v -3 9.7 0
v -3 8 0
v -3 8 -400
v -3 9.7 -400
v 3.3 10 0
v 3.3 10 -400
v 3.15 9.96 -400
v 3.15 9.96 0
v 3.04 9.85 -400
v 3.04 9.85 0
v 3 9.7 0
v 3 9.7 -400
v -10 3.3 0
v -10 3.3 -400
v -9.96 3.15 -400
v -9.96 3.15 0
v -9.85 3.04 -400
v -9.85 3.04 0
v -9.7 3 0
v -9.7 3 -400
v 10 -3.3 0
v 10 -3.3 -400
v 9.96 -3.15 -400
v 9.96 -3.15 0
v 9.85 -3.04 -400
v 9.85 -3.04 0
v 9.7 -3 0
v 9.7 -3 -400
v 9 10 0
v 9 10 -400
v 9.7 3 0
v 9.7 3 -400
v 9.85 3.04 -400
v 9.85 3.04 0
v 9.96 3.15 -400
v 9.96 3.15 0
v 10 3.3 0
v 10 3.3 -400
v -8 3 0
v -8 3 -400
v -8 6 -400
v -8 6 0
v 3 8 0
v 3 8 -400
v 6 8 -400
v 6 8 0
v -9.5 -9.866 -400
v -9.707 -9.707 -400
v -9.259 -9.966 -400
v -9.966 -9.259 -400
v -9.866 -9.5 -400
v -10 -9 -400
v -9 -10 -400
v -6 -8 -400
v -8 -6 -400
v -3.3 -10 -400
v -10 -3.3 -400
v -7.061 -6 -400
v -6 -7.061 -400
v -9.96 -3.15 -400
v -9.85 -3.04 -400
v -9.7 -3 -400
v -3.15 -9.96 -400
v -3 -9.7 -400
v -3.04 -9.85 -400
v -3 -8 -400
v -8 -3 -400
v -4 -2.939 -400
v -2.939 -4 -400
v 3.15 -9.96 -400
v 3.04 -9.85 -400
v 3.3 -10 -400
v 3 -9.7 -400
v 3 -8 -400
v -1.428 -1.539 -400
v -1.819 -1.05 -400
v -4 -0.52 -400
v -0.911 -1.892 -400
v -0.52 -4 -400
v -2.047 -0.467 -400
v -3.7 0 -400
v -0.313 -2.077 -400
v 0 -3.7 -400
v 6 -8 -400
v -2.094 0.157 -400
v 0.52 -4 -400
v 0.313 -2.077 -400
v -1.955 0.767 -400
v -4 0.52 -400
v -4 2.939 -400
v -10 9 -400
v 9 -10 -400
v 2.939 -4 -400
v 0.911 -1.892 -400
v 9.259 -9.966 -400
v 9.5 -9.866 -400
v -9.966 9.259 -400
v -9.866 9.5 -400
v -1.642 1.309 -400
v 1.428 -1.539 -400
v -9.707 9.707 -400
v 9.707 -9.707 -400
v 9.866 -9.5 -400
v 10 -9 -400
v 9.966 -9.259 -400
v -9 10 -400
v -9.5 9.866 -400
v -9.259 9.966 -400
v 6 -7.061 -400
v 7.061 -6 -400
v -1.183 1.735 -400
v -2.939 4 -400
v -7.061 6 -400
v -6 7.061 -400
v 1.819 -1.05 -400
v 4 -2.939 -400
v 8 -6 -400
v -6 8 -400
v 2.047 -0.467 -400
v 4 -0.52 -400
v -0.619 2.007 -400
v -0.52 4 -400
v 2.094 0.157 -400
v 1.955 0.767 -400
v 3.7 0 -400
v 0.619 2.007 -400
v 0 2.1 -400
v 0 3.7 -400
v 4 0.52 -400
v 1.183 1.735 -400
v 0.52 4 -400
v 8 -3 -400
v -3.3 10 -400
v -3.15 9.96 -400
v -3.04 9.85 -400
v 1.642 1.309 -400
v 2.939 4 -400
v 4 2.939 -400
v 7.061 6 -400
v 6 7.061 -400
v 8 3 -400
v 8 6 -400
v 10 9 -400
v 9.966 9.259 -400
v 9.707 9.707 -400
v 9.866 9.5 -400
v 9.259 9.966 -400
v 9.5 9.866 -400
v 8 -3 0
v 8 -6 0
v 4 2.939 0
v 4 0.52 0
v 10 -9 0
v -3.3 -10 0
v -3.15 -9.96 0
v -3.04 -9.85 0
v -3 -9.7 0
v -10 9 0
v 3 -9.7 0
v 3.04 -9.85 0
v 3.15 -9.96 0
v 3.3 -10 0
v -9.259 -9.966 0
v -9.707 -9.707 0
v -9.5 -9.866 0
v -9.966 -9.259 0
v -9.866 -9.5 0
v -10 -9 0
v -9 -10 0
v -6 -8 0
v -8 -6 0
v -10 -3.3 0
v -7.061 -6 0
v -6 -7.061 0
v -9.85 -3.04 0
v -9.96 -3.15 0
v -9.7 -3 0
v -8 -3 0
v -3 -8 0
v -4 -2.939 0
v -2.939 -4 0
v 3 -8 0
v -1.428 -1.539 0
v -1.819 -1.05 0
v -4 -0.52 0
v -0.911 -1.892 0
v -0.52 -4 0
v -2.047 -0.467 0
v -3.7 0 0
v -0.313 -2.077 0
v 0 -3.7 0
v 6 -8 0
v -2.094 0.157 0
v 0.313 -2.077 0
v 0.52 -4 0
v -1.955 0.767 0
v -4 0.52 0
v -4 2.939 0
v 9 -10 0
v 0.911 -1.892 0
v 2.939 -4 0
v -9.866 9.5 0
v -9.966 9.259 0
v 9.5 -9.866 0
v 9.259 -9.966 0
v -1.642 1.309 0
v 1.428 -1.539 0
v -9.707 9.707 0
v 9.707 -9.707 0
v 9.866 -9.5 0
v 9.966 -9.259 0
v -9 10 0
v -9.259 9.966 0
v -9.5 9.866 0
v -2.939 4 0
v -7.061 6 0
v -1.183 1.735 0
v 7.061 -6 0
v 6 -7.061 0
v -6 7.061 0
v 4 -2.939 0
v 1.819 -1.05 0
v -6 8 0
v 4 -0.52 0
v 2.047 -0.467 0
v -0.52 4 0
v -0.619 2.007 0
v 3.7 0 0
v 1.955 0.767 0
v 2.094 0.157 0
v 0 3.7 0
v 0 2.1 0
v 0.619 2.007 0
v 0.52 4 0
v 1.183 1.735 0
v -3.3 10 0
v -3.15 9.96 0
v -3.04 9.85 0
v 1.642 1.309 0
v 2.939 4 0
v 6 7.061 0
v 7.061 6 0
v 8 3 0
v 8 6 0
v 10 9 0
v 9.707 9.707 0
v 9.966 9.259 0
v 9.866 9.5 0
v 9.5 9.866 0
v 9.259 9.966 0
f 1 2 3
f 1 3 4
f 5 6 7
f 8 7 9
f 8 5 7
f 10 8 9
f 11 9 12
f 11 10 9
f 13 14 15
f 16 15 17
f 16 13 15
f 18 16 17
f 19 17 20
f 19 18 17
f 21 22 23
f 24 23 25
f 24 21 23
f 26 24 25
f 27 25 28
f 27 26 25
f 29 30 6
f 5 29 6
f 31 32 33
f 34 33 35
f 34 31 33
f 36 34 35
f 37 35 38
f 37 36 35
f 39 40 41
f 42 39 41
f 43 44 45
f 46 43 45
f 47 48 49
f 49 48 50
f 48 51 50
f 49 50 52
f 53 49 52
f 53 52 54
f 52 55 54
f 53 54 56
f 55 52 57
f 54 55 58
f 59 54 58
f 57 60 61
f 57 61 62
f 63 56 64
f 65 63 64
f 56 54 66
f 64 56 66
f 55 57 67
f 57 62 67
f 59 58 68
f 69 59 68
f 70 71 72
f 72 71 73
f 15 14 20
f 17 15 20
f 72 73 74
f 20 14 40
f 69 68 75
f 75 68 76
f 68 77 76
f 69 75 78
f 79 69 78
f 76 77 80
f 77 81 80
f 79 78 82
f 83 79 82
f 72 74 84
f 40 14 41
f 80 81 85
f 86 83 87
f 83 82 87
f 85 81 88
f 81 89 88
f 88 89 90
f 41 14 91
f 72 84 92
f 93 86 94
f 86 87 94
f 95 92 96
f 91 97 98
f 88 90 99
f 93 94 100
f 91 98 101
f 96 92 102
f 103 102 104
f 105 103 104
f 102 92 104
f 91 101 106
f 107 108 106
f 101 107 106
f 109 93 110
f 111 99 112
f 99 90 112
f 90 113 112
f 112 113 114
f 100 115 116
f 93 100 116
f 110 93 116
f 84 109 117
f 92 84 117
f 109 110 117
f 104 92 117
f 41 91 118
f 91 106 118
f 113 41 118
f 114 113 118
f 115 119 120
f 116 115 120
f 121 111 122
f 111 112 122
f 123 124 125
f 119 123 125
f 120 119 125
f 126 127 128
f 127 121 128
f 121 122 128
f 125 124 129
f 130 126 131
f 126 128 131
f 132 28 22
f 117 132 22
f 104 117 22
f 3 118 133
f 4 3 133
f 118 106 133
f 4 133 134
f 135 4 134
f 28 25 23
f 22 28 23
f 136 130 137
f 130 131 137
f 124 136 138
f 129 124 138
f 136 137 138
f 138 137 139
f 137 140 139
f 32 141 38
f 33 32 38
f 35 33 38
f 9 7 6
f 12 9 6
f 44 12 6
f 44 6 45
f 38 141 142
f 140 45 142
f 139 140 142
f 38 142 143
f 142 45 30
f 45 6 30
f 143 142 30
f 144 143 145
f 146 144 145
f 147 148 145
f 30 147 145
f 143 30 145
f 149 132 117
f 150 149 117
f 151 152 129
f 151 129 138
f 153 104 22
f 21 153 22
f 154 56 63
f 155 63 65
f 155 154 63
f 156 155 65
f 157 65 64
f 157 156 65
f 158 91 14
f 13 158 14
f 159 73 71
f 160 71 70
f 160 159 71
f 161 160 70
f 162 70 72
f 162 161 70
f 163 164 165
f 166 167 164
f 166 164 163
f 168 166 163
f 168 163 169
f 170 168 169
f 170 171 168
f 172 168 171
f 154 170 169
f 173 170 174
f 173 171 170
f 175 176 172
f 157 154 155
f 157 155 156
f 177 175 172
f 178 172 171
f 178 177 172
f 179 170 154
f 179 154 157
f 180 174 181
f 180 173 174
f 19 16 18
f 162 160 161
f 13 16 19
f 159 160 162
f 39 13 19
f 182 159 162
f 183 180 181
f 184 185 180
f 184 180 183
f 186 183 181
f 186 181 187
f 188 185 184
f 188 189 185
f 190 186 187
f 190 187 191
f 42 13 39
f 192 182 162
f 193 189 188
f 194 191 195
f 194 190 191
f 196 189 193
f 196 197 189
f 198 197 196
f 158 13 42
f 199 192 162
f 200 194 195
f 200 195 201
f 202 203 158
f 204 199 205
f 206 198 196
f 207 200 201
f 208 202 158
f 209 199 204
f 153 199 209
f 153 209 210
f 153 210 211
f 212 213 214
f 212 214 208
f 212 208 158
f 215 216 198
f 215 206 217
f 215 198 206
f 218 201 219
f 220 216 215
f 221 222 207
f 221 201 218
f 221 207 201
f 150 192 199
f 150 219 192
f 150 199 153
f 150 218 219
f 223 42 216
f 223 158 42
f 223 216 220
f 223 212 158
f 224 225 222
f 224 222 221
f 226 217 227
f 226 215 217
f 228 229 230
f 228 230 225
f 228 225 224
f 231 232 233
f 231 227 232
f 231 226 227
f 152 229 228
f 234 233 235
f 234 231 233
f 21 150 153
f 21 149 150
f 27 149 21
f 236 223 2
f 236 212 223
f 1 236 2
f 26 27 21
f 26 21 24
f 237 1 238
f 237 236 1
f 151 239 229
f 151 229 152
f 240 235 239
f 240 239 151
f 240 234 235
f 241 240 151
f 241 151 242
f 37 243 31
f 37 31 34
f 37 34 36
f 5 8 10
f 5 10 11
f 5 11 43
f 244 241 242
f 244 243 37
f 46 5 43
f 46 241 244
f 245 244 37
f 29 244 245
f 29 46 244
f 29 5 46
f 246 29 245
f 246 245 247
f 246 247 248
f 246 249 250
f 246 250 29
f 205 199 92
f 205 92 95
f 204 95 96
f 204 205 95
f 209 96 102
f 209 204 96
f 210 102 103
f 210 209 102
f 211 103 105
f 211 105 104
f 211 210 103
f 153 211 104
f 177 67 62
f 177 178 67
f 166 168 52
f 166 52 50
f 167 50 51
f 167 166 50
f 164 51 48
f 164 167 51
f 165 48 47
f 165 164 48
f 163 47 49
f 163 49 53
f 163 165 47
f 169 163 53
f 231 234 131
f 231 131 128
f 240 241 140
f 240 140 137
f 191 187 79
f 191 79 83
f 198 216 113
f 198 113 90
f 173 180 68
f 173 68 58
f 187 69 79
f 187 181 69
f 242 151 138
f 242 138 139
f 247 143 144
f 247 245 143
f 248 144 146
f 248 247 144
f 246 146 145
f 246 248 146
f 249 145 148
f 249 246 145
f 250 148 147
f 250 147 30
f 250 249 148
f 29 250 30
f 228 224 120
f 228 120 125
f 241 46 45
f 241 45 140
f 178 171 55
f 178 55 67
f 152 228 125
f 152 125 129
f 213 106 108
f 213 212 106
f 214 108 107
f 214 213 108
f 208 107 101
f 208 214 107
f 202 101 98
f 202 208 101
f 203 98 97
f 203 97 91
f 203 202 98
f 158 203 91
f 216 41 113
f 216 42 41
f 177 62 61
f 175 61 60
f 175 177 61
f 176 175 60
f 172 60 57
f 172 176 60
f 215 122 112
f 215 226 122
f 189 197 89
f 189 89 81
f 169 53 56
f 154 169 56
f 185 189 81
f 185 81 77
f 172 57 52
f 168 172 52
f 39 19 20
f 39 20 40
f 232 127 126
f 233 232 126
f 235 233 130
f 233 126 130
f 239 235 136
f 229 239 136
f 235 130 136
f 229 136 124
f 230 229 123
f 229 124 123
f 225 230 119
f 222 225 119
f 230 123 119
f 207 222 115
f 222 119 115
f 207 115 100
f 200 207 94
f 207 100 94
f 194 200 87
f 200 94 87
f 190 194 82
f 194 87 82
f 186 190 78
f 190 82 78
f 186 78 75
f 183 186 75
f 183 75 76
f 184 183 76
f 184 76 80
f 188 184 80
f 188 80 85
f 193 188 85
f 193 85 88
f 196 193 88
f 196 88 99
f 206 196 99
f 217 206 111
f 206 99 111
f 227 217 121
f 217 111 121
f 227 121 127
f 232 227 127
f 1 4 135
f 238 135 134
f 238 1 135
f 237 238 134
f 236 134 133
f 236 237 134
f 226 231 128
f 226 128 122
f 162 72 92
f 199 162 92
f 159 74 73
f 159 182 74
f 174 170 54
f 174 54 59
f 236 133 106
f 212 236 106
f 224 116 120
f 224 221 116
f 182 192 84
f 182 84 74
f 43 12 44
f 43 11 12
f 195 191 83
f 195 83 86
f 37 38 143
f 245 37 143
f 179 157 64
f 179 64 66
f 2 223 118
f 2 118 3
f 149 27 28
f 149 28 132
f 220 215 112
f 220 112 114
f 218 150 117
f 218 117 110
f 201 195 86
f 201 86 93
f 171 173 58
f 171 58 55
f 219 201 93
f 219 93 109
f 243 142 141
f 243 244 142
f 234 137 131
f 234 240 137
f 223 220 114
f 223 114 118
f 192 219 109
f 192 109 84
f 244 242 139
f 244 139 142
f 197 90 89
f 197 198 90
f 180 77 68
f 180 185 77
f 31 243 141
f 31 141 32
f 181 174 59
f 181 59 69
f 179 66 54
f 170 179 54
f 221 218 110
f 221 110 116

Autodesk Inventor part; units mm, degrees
sketch "Sketch_1" plane through (0, 0, 0) normal (0, 0, 1) x (1, 0, 0)
  line L0 (-10, 9) -> (-10, 3.3)
  arc A0 (-10, 3.3) -> (-9.7, 3) centre (-9.7, 3.3) ccw
  line L1 (-9.7, 3) -> (-8, 3)
  line L2 (-8, 3) -> (-8, 6)
  line L3 (-8, 6) -> (-7.0607, 6)
  line L4 (-7.0607, 6) -> (-4, 2.9393)
  line L5 (-4, 2.9393) -> (-4, 0.5196)
  line L6 (-4, 0.5196) -> (-3.7, 0)
  line L7 (-3.7, 0) -> (-4, -0.5196)
  line L8 (-4, -0.5196) -> (-4, -2.9393)
  line L9 (-4, -2.9393) -> (-7.0607, -6)
  line L10 (-7.0607, -6) -> (-8, -6)
  line L11 (-8, -6) -> (-8, -3)
  line L12 (-8, -3) -> (-9.7, -3)
  arc A1 (-9.7, -3) -> (-10, -3.3) centre (-9.7, -3.3) ccw
  line L13 (-10, -3.3) -> (-10, -9)
  arc A2 (-10, -9) -> (-9, -10) centre (-9, -9) ccw
  line L14 (-9, -10) -> (-3.3, -10)
  arc A3 (-3.3, -10) -> (-3, -9.7) centre (-3.3, -9.7) ccw
  line L15 (-3, -9.7) -> (-3, -8)
  line L16 (-3, -8) -> (-6, -8)
  line L17 (-6, -8) -> (-6, -7.0607)
  line L18 (-6, -7.0607) -> (-2.9393, -4)
  line L19 (-2.9393, -4) -> (-0.5196, -4)
  line L20 (-0.5196, -4) -> (0, -3.7)
  line L21 (0, -3.7) -> (0.5196, -4)
  line L22 (0.5196, -4) -> (2.9393, -4)
  line L23 (2.9393, -4) -> (6, -7.0607)
  line L24 (6, -7.0607) -> (6, -8)
  line L25 (6, -8) -> (3, -8)
  line L26 (3, -8) -> (3, -9.7)
  arc A4 (3, -9.7) -> (3.3, -10) centre (3.3, -9.7) ccw
  line L27 (3.3, -10) -> (9, -10)
  arc A5 (9, -10) -> (10, -9) centre (9, -9) ccw
  line L28 (10, -9) -> (10, -3.3)
  arc A6 (10, -3.3) -> (9.7, -3) centre (9.7, -3.3) ccw
  line L29 (9.7, -3) -> (8, -3)
  line L30 (8, -3) -> (8, -6)
  line L31 (8, -6) -> (7.0606, -6)
  line L32 (7.0606, -6) -> (4, -2.9393)
  line L33 (4, -2.9393) -> (4, -0.5196)
  line L34 (4, -0.5196) -> (3.7, 0)
  line L35 (3.7, 0) -> (4, 0.5196)
  line L36 (4, 0.5196) -> (4, 2.9393)
  line L37 (4, 2.9393) -> (7.0607, 6)
  line L38 (7.0607, 6) -> (8, 6)
  line L39 (8, 6) -> (8, 3)
  line L40 (8, 3) -> (9.7, 3)
  arc A7 (9.7, 3) -> (10, 3.3) centre (9.7, 3.3) ccw
  line L41 (10, 3.3) -> (10, 9)
  arc A8 (10, 9) -> (9, 10) centre (9, 9) ccw
  line L42 (9, 10) -> (3.3, 10)
  arc A9 (3.3, 10) -> (3, 9.7) centre (3.3, 9.7) ccw
  line L43 (3, 9.7) -> (3, 8)
  line L44 (3, 8) -> (6, 8)
  line L45 (6, 8) -> (6, 7.0607)
  line L46 (6, 7.0607) -> (2.9393, 4)
  line L47 (2.9393, 4) -> (0.5196, 4)
  line L48 (0.5196, 4) -> (0, 3.7)
  line L49 (0, 3.7) -> (-0.5196, 4)
  line L50 (-0.5196, 4) -> (-2.9394, 4)
  line L51 (-2.9394, 4) -> (-6, 7.0606)
  line L52 (-6, 7.0606) -> (-6, 8)
  line L53 (-6, 8) -> (-3, 8)
  line L54 (-3, 8) -> (-3, 9.7)
  arc A10 (-3, 9.7) -> (-3.3, 10) centre (-3.3, 9.7) ccw
  line L55 (-3.3, 10) -> (-9, 10)
  arc A11 (-9, 10) -> (-10, 9) centre (-9, 9) ccw
extrude "Extrusion1" add sketch "Sketch_1" against normal blind 400
sketch "Sketch_2" plane through (0, 0, 0) normal (1, 0, 0) x (0, 0, -1)
  line L0 (400, 0) -> (0, 0)
  line L1 (0, 0) -> (0, 2.1)
  line L2 (0, 2.1) -> (400, 2.1)
  line L3 (400, 2.1) -> (400, 0)
  line L4 (400, 0) -> (0, 0)
revolve "Revolution1" cut sketch "Sketch_2" angle 360 about axis through (0, 0, -400) along (0, 0, -1)
ref_plane "C1_XY" through (0, 0, 0) normal (0, 0, 1) x (1, 0, 0)
ref_plane "C1_YZ" through (0, 0, 0) normal (1, 0, 0) x (0, 1, 0)
ref_plane "C1_ZX" through (0, 0, 0) normal (0, 1, 0) x (0, 0, 1)
properties part number "CAF5-2020-400"
